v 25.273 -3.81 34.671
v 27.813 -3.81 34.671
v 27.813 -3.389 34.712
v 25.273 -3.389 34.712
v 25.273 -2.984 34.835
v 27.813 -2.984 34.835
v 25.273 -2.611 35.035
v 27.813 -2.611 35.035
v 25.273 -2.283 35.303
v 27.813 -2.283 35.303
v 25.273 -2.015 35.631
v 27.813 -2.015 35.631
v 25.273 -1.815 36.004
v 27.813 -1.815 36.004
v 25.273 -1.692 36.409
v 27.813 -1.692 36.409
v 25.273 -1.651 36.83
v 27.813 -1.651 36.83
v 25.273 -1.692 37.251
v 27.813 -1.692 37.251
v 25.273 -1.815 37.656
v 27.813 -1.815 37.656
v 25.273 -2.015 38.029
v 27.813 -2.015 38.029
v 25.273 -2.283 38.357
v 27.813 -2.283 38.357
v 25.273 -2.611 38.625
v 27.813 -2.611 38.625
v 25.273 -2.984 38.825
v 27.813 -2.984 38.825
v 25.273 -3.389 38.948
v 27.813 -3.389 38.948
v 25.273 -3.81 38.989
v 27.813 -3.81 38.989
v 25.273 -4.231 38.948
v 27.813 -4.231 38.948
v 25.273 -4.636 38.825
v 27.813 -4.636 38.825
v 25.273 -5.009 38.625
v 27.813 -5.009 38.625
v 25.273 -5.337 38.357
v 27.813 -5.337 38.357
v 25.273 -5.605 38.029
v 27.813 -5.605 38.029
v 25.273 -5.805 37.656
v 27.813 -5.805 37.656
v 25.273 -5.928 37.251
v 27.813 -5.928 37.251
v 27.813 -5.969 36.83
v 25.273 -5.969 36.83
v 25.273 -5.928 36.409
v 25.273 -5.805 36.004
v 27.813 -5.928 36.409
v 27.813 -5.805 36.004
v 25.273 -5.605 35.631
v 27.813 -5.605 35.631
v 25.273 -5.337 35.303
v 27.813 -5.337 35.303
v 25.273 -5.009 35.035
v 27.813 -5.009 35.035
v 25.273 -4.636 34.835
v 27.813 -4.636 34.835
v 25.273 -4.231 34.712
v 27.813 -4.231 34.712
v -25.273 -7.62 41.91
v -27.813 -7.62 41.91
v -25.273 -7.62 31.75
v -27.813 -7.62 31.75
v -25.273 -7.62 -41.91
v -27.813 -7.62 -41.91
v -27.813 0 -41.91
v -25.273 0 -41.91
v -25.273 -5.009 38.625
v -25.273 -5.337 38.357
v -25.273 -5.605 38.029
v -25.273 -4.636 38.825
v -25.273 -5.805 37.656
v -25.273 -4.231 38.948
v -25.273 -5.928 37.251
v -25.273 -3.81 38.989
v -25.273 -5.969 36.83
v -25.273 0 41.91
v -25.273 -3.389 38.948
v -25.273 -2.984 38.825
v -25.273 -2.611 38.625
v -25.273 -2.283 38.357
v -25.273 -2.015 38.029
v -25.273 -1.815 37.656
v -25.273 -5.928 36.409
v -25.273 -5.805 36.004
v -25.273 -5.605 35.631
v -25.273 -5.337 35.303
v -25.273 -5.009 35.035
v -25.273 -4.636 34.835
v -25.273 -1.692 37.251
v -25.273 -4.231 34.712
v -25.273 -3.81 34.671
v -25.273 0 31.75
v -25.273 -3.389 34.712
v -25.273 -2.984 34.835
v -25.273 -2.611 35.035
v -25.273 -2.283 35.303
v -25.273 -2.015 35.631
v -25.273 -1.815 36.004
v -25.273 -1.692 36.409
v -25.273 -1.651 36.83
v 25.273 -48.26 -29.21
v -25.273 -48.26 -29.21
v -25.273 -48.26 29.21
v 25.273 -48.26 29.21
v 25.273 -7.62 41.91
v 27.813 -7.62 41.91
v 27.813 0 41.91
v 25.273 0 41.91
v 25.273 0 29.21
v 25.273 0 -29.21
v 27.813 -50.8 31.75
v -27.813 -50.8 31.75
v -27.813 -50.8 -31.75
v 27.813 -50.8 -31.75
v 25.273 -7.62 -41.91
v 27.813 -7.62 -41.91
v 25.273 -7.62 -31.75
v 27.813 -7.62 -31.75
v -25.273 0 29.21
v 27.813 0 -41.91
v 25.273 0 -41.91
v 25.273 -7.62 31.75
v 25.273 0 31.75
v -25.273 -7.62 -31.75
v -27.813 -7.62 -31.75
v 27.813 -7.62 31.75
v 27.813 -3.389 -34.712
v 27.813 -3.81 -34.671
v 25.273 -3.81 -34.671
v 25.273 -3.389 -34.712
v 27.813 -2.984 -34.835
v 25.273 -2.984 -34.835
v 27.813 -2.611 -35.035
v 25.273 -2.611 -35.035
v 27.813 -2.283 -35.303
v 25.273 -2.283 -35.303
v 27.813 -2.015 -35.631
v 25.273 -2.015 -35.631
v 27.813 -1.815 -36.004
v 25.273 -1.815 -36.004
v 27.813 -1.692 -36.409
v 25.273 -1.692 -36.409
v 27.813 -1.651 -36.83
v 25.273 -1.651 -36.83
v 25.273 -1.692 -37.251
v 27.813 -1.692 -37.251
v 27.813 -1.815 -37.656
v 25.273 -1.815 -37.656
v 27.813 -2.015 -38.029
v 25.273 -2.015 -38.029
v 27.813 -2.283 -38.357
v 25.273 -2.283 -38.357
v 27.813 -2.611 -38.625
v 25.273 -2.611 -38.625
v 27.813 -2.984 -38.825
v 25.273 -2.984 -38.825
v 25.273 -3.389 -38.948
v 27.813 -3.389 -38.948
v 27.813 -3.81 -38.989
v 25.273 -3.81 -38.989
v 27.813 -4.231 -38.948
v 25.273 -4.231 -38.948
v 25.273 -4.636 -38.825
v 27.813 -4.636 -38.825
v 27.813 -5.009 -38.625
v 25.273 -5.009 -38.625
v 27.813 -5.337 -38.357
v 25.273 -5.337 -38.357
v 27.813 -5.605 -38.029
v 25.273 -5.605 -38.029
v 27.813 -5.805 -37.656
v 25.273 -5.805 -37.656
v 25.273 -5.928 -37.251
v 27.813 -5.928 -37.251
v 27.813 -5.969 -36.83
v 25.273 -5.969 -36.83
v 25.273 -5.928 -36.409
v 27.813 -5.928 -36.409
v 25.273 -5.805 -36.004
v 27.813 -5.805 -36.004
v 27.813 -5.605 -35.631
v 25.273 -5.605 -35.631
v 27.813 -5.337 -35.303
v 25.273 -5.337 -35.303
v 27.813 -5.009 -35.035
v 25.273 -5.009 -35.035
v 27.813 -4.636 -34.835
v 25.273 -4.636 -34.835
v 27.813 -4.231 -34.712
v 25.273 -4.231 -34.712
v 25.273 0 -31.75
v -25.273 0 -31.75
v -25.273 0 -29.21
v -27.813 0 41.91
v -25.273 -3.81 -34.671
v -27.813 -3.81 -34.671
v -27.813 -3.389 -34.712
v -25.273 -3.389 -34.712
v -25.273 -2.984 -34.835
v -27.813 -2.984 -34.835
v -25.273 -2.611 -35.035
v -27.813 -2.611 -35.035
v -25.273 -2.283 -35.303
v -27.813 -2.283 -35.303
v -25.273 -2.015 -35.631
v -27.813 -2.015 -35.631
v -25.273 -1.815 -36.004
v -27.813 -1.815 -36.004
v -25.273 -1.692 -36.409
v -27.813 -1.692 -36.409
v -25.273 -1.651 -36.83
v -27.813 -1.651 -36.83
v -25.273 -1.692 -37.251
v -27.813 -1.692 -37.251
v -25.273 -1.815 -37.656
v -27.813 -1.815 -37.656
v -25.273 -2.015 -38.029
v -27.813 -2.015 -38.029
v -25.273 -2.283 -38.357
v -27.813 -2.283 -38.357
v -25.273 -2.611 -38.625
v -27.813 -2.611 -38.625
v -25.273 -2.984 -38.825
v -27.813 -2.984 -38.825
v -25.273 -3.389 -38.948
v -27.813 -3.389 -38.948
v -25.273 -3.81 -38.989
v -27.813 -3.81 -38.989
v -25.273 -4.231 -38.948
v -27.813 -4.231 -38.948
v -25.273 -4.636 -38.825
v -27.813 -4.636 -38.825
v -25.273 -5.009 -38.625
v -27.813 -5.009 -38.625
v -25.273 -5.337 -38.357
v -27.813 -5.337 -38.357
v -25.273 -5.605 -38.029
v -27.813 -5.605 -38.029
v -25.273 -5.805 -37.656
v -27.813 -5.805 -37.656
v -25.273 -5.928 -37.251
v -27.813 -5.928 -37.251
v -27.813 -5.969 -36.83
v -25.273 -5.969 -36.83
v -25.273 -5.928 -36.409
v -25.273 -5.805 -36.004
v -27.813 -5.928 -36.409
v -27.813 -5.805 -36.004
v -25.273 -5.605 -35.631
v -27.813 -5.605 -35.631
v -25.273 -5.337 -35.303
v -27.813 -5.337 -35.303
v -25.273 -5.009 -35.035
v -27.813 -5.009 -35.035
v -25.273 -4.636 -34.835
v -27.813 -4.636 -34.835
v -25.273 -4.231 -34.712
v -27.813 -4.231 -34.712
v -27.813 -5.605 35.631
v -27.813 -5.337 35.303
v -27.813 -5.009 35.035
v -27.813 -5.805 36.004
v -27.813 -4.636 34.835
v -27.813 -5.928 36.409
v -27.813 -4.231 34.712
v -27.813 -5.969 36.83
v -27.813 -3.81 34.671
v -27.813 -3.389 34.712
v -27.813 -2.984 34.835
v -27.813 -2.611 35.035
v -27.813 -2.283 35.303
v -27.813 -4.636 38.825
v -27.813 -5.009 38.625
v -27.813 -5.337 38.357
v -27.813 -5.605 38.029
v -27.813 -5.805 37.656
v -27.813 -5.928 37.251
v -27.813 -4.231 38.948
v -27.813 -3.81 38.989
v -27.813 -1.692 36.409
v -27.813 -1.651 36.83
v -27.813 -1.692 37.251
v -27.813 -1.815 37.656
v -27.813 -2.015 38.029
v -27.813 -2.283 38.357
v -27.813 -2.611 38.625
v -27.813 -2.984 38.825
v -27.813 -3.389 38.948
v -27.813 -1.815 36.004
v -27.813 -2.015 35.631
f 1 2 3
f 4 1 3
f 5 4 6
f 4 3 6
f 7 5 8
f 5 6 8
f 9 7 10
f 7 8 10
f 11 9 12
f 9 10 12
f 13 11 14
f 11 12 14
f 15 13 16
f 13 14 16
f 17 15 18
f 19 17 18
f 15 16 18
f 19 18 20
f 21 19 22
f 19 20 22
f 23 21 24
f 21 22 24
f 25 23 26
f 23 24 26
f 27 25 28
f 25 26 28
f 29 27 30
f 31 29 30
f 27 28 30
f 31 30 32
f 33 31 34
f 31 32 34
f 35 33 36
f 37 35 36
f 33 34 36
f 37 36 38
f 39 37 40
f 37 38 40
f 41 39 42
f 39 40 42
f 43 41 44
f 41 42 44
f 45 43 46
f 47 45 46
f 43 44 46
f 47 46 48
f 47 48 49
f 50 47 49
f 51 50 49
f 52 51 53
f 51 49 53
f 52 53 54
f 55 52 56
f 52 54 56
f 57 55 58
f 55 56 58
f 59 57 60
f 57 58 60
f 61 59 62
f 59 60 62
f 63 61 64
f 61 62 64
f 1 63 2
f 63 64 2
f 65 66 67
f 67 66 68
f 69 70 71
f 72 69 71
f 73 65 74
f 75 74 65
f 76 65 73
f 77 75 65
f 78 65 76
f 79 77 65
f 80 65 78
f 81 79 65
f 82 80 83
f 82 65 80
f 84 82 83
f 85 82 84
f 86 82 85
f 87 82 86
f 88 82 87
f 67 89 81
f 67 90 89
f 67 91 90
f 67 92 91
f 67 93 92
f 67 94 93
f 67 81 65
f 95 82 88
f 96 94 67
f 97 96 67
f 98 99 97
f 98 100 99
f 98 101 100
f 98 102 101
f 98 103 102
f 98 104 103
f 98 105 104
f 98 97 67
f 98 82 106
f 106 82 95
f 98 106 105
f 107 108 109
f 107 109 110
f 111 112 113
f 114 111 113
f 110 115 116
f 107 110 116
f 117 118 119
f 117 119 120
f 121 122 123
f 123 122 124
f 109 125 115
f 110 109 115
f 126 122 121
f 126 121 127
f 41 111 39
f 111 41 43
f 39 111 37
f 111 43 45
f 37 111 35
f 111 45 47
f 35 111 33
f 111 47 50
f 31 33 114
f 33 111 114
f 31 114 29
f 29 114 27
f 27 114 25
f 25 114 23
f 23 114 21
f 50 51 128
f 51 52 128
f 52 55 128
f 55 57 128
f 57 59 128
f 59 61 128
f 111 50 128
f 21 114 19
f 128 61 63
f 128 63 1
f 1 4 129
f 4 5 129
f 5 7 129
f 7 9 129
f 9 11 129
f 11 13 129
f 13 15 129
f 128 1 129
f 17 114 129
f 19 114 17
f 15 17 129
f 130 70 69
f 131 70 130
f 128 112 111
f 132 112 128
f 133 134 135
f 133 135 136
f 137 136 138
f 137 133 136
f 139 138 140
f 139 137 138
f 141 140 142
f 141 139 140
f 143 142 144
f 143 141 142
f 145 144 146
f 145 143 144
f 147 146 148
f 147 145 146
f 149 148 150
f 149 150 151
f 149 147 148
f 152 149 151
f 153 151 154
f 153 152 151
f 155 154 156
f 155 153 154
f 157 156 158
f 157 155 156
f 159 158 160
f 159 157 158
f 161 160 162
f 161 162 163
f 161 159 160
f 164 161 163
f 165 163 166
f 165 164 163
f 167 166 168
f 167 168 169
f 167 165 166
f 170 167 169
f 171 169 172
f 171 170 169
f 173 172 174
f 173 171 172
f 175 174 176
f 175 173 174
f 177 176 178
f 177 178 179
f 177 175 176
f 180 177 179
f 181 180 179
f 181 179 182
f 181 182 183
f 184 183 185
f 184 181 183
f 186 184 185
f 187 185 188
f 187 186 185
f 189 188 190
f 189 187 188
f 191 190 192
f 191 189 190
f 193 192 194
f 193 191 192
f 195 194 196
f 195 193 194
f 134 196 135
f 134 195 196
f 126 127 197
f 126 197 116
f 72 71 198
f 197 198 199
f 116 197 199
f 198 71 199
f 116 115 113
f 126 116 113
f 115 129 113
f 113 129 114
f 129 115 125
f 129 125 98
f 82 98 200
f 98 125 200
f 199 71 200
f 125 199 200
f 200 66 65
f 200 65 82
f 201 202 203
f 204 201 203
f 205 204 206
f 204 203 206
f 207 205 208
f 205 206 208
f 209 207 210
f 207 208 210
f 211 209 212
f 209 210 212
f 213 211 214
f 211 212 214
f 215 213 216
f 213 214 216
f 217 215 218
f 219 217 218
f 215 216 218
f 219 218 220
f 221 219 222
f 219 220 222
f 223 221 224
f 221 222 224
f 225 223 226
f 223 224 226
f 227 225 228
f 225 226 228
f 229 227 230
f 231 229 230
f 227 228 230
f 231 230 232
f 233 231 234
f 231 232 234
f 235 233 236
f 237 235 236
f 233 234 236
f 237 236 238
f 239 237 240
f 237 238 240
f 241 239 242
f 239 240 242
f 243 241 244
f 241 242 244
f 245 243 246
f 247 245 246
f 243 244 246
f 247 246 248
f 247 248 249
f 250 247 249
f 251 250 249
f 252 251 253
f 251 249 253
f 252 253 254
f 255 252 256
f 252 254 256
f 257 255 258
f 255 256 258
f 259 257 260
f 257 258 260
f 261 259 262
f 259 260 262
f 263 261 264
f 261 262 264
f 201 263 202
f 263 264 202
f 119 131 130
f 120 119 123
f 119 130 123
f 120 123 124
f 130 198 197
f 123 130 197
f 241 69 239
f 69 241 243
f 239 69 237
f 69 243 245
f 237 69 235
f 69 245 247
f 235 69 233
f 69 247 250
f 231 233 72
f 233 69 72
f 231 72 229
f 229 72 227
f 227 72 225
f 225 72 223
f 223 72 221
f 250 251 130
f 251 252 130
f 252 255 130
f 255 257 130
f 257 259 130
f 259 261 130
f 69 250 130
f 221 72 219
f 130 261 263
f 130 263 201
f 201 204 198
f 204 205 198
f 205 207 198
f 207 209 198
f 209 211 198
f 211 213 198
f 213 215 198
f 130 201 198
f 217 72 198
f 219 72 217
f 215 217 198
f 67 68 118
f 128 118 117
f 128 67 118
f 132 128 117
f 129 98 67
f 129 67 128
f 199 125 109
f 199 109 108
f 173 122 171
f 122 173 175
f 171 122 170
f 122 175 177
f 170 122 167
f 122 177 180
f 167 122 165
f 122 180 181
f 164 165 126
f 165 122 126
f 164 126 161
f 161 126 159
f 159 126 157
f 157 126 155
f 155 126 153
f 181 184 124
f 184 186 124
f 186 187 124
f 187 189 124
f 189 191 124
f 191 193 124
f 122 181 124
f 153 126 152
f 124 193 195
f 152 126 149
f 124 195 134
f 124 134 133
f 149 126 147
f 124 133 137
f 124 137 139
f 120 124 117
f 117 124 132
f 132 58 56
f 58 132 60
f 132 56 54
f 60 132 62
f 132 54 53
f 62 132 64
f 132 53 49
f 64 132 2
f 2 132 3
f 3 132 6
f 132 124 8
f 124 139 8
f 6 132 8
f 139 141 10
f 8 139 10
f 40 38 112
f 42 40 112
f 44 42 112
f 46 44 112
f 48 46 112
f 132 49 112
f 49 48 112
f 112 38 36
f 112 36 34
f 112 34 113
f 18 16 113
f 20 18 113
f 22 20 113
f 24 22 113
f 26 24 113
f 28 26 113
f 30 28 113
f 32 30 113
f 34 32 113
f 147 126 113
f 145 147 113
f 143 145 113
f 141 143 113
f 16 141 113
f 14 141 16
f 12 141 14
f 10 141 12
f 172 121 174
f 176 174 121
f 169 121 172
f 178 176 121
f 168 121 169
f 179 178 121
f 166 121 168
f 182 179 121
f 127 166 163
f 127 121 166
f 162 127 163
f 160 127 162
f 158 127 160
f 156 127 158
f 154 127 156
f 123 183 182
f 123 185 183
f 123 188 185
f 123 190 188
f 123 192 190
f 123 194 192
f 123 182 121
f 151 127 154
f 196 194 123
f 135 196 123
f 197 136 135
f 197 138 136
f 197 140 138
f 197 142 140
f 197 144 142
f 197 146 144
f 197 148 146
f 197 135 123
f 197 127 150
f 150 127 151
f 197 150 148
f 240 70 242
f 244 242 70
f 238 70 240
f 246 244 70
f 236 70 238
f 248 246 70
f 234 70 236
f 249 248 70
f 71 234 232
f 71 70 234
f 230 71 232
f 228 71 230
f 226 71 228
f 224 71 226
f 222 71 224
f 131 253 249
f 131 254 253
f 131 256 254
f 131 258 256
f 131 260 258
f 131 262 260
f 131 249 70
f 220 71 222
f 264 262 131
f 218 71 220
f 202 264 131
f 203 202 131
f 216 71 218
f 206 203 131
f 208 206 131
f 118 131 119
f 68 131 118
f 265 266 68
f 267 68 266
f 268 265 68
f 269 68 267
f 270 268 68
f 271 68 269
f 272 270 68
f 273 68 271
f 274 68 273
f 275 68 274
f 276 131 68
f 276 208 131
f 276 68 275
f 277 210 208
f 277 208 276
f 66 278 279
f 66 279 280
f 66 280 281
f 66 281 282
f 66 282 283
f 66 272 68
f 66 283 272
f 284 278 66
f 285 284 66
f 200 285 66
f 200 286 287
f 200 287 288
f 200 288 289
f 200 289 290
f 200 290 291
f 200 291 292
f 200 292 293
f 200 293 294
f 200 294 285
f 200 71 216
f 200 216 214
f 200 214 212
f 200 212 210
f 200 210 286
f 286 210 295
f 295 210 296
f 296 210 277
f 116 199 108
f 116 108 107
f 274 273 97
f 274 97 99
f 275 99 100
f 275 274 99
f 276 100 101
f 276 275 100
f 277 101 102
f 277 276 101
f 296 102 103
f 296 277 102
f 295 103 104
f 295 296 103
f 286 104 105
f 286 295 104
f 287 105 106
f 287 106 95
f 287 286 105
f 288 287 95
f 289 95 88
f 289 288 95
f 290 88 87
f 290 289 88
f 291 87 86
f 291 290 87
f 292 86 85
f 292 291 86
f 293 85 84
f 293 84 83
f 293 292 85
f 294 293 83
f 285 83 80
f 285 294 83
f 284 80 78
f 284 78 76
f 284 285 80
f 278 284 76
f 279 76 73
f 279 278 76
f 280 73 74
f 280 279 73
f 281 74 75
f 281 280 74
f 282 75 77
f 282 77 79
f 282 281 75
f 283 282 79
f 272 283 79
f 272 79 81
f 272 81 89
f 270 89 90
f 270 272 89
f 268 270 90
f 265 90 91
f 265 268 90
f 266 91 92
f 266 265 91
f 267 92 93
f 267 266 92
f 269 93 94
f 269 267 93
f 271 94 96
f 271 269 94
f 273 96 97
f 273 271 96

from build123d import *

# Parameters (mm, degrees)
SKETCH1_W               = 55.626
SKETCH1_H               = 63.5
BOSS_EXTRUDE1_DEPTH     = 50.8
SKETCH2_W               = 50.546
SKETCH2_H               = 58.42
CUT_EXTRUDE1_DEPTH      = 48.26
SKETCH3_W               = 10.16
SKETCH3_H               = 7.62
SKETCH3_R               = 2.159
BOSS_EXTRUDE2_DEPTH     = 2.54
MIRROR2_COPY_1_SKETCH_W = 10.16
MIRROR2_COPY_1_SKETCH_H = 7.62
MIRROR2_COPY_1_SKETCH_R = 2.159
MIRROR2_COPY_1_DEPTH    = 2.54


with BuildPart() as part:
    # Sketch1 → Boss-Extrude1 (new body)
    with BuildSketch(Plane(origin=(0, 0, 0), x_dir=(1, 0, 0), z_dir=(0, 1, 0))):
        Rectangle(SKETCH1_W, SKETCH1_H)
    extrude(amount=-BOSS_EXTRUDE1_DEPTH)

    # Sketch2 → Cut-Extrude1 (cut)
    with BuildSketch(Plane(origin=(0, 0, 0), x_dir=(1, 0, 0), z_dir=(0, 1, 0))):
        Rectangle(SKETCH2_W, SKETCH2_H)
    extrude(amount=-CUT_EXTRUDE1_DEPTH, mode=Mode.SUBTRACT)

    # Sketch3 → Boss-Extrude2 (add)
    with BuildSketch(Plane(origin=(27.813, 0, 0), x_dir=(0, 0, -1), z_dir=(1, 0, 0))):
        with Locations((-36.83, -3.81)):
            Rectangle(SKETCH3_W, SKETCH3_H)
        with Locations((-36.83, -3.81)):
            Circle(SKETCH3_R, mode=Mode.SUBTRACT)
    boss_extrude2 = extrude(amount=-BOSS_EXTRUDE2_DEPTH)

    # Mirror1: Boss-Extrude2 across plane
    add(boss_extrude2.mirror(Plane.XY))

    # Mirror2: Boss-Extrude2 across plane
    add(boss_extrude2.mirror(Plane(origin=(0, 0, 0), x_dir=(0, 0, 1), z_dir=(1, 0, 0))))

    # Mirror2 copy 1 sketch → Mirror2 copy 1 (add)
    with BuildSketch(Plane.ZY.offset(27.813)):
        with Locations((-36.83, -3.81)):
            Rectangle(MIRROR2_COPY_1_SKETCH_W, MIRROR2_COPY_1_SKETCH_H)
        with Locations((-36.83, -3.81)):
            Circle(MIRROR2_COPY_1_SKETCH_R, mode=Mode.SUBTRACT)
    extrude(amount=-MIRROR2_COPY_1_DEPTH)


solid = part.part
